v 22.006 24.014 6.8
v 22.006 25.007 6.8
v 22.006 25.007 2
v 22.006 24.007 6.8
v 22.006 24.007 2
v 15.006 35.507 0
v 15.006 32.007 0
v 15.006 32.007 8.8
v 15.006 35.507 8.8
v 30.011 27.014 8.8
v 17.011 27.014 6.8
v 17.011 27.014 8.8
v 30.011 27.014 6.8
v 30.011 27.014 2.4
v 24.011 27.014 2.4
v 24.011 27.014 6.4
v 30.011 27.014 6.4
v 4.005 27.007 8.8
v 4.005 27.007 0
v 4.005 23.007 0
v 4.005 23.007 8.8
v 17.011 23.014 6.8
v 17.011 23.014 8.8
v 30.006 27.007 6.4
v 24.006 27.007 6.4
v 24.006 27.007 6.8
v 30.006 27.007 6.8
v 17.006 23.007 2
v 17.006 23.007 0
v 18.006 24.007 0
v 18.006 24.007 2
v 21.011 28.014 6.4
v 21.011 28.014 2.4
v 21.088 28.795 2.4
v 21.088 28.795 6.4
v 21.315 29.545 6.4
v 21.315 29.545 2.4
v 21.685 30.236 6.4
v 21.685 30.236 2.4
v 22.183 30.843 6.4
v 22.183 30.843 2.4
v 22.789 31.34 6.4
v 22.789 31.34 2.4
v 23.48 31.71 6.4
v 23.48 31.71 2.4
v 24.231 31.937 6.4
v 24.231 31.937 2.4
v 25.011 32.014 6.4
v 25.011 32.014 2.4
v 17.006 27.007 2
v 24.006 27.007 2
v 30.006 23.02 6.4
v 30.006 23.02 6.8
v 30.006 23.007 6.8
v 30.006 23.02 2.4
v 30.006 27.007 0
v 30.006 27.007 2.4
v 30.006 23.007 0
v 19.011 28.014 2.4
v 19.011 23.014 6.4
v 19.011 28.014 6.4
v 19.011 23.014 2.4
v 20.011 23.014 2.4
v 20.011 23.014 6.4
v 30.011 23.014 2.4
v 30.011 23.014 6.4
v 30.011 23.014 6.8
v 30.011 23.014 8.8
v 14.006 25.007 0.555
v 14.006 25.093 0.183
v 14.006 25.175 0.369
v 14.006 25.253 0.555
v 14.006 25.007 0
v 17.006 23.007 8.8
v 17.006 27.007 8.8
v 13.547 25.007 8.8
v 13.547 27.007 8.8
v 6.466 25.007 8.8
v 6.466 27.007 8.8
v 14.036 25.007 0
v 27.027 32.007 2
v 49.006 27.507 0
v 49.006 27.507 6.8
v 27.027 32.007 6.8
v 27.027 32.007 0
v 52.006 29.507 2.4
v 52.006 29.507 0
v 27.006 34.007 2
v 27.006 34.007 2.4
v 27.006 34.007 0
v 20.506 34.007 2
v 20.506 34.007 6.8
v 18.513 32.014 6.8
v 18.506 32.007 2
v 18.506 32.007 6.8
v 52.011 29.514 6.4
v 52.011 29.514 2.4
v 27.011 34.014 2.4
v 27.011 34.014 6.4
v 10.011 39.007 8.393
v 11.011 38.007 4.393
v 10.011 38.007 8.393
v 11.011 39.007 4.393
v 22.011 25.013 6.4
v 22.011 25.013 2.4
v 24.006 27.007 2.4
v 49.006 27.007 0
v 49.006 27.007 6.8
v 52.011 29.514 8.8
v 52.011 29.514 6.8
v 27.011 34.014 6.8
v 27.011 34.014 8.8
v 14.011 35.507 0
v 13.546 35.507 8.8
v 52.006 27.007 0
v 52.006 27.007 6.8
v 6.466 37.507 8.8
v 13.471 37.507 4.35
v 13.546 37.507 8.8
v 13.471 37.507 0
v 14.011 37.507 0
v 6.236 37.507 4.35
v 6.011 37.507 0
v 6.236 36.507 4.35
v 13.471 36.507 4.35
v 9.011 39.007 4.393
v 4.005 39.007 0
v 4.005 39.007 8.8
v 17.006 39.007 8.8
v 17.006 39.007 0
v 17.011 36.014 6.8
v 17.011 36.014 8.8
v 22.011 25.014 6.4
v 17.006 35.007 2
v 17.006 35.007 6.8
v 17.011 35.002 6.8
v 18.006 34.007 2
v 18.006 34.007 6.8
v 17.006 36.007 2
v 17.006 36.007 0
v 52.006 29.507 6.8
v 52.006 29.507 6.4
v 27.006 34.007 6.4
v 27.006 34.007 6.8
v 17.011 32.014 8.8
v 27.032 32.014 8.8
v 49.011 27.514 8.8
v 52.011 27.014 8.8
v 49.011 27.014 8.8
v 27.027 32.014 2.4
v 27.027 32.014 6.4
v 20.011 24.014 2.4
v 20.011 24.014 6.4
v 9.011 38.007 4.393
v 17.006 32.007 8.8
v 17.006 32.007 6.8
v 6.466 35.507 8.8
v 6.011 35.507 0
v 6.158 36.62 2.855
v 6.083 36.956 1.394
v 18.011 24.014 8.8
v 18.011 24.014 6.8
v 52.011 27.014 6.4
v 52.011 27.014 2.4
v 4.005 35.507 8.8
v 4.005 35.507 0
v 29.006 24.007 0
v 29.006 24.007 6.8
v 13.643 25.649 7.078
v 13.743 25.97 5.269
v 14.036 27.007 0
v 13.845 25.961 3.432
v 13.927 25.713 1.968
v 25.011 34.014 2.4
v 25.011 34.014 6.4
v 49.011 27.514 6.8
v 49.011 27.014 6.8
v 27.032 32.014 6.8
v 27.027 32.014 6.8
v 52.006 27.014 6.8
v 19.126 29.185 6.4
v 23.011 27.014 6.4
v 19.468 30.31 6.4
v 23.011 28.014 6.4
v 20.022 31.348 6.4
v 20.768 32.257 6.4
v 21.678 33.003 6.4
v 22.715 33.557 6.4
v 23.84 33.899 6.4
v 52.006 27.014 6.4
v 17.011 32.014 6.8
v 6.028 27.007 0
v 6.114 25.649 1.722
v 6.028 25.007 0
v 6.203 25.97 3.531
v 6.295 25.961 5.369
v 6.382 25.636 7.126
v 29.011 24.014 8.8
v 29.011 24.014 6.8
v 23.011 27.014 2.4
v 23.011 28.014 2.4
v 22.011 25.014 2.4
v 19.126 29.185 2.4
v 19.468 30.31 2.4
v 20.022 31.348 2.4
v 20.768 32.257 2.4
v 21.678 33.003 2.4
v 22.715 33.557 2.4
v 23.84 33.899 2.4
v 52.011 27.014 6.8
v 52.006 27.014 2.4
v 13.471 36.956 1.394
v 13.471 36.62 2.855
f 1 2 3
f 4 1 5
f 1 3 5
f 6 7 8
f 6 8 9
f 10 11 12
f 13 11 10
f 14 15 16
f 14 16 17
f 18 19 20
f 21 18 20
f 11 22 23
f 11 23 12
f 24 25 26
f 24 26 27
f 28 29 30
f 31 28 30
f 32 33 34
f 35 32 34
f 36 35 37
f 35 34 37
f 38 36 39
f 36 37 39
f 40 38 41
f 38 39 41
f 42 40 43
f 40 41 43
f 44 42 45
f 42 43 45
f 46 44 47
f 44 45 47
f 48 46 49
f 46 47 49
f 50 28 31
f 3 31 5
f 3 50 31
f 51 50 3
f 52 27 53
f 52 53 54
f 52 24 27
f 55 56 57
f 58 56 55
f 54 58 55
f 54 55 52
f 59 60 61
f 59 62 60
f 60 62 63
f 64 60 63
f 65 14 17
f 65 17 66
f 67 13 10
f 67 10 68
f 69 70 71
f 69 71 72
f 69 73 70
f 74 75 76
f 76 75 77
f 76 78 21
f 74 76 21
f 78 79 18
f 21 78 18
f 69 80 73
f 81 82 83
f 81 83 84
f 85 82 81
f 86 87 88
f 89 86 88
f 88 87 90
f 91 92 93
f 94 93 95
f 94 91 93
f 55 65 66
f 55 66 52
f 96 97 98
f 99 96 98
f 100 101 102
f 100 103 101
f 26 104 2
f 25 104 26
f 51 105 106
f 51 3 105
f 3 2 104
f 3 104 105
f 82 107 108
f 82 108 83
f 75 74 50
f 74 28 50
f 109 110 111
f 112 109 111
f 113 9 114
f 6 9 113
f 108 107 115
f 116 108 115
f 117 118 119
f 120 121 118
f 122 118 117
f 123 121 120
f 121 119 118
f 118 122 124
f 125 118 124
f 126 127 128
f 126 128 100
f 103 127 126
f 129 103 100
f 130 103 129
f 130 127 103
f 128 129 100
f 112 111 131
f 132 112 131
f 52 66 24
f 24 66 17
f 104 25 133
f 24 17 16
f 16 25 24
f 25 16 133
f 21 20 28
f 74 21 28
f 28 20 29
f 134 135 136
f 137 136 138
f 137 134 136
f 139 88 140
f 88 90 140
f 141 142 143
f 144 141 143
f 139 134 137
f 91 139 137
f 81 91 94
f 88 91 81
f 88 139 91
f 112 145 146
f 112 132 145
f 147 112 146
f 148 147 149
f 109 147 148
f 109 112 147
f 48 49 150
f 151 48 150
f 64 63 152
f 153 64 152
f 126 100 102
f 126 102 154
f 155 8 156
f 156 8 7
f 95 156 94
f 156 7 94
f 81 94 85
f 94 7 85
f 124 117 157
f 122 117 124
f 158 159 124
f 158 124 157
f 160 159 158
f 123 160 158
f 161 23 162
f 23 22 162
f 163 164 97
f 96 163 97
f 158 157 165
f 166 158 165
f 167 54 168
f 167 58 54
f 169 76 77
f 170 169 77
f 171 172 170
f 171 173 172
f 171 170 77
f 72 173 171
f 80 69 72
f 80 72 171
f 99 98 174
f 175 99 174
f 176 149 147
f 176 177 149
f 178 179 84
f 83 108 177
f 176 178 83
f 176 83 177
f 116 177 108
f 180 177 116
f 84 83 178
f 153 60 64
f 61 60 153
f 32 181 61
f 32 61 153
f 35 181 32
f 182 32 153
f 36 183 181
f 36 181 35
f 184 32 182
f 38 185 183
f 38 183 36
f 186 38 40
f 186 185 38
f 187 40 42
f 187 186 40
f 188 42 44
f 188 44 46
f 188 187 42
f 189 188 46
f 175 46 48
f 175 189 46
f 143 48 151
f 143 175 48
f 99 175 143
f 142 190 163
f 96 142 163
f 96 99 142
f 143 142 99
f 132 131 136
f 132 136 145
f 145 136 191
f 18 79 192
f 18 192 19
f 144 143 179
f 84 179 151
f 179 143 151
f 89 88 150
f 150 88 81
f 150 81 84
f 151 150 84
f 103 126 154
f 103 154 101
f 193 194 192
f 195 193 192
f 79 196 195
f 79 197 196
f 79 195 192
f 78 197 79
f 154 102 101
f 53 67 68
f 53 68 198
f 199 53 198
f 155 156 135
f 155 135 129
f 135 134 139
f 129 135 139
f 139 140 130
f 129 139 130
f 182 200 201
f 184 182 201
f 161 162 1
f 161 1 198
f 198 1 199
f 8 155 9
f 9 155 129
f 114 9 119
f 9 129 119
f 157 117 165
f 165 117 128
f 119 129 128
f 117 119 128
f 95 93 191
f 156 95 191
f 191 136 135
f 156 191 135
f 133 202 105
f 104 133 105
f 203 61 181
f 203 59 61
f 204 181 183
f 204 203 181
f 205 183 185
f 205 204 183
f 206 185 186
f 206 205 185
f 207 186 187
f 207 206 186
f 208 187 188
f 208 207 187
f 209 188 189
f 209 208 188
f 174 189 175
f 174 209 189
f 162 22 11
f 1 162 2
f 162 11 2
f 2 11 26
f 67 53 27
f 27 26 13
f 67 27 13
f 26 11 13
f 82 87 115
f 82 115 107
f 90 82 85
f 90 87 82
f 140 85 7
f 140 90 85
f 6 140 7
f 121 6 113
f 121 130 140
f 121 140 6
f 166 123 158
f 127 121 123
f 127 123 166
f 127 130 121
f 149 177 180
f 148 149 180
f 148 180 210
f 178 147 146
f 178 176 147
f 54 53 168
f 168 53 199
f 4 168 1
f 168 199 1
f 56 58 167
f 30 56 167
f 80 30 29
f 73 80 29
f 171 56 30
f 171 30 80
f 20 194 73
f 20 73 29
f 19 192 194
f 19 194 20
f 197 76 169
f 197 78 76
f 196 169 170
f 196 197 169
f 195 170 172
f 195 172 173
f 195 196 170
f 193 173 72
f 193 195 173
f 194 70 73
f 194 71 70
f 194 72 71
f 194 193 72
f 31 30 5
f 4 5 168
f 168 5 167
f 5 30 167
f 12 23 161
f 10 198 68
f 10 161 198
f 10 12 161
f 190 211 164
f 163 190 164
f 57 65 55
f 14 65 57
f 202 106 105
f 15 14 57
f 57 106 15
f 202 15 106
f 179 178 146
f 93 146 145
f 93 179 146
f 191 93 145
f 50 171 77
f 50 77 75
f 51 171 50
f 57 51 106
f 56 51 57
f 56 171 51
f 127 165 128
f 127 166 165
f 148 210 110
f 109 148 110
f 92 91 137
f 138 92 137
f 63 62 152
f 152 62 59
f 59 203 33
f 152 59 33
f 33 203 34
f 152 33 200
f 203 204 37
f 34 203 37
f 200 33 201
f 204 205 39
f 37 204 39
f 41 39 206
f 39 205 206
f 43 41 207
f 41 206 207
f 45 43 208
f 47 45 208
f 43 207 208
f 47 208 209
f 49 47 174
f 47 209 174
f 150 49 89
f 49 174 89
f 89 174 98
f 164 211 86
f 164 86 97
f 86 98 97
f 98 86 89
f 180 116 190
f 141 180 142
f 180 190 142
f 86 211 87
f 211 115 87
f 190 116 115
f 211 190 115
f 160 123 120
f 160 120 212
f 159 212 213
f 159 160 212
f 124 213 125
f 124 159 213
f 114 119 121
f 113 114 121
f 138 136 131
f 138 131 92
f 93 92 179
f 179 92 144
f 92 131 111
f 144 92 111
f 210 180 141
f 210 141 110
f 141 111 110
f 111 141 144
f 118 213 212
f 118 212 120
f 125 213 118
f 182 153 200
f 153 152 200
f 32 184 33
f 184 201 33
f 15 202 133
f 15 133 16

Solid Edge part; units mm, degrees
sketch "Sketch1" plane through (0, 0, 0) normal (0, 0, 1) x (1, 0, 0)
  line L0 (4.0055, 39.0071) -> (17.0055, 39.0071)
  line L1 (17.0055, 36.0071) -> (17.0055, 39.0071)
  line L2 (17.0055, 36.0071) -> (17.0055, 35.0071)
  line L3 (17.0055, 35.0071) -> (17.0055, 32.0071)
  line L4 (15.0055, 32.0071) -> (17.0055, 32.0071)
  line L5 (15.0055, 32.0071) -> (15.0055, 37.5071)
  line L6 (15.0055, 37.5071) -> (5.0055, 37.5071)
  line L7 (5.0055, 37.5071) -> (5.0055, 35.5071)
  line L8 (5.0055, 35.5071) -> (4.0055, 35.5071)
  line L9 (4.0055, 35.5071) -> (4.0055, 39.0071)
  line L10 (15.0055, 27.0071) -> (17.0055, 27.0071)
  line L11 (17.0055, 23.0071) -> (17.0055, 27.0071)
  line L12 (4.0055, 23.0071) -> (17.0055, 23.0071)
  line L13 (4.0055, 27.0071) -> (4.0055, 23.0071)
  line L14 (5.0055, 27.0071) -> (4.0055, 27.0071)
  line L15 (5.0055, 25.0071) -> (5.0055, 27.0071)
  line L16 (15.0055, 25.0071) -> (5.0055, 25.0071)
  line L17 (15.0055, 25.0071) -> (15.0055, 27.0071)
  dimension "D1" = 22
  dimension "D2" = 9.7
  dimension "D3" = 8.1
extrude "Protrusion1" add sketch "Sketch1" along normal blind 8.8
sketch "Sketch2" plane through (0, 0, 0) normal (0, 0, 1) x (1, 0, 0)
  line L0 (27.0055, 34.0071) -> (17.0055, 36.0071)
  line L1 (17.0055, 36.0071) -> (17.0055, 35.0071)
  line L2 (17.0055, 35.0071) -> (17.0055, 32.0071)
  line L3 (17.0055, 32.0071) -> (18.5055, 32.0071)
  line L4 (25.0055, 32.0071) -> (18.5055, 32.0071)
  line L5 (25.0055, 32.0071) -> (27.0269, 32.0071)
  line L6 (49.0055, 27.5071) -> (27.0269, 32.0071)
  line L7 (49.0055, 27.0071) -> (49.0055, 27.5071)
  line L8 (49.0055, 27.0071) -> (52.0055, 27.0071)
  line L9 (52.0055, 27.0071) -> (52.0055, 29.5071)
  line L10 (52.0055, 29.5071) -> (27.0055, 34.0071)
  line L11 (17.0055, 23.0071) -> (18.0055, 24.0071)
  line L12 (18.0055, 24.0071) -> (22.0055, 24.0071)
  line L13 (29.0055, 24.0071) -> (22.0055, 24.0071)
  line L14 (30.0055, 23.0071) -> (29.0055, 24.0071)
  line L15 (30.0055, 27.0071) -> (30.0055, 23.0071)
  line L16 (24.0055, 27.0071) -> (30.0055, 27.0071)
  line L17 (24.0055, 27.0071) -> (17.0055, 27.0071)
  line L18 (17.0055, 23.0071) -> (17.0055, 27.0071)
  dimension "D1" = 22
  dimension "D2" = 9.7
  dimension "D3" = 8.1
extrude "RightEdgeProtrusion" add sketch "Sketch2" along normal blind 2
sketch "Sketch3" plane through (26.0055, 25.0071, 2.4) normal (0, 0, 1) x (1, 0, 0)
  line L0 (1.0055, 9.0071) -> (-0.9945, 9.0071)
  arc A0 (-6.9945, 3.0071) -> (-0.9945, 9.0071) centre (-0.9945, 3.0071) cw
  line L1 (-6.9945, -1.9929) -> (-6.9945, 3.0071)
  line L2 (-6.9945, -1.9929) -> (-5.9945, -1.9929)
  line L3 (-5.9945, -1.9929) -> (-5.9945, -0.9929)
  line L4 (-5.9945, -0.9929) -> (-2.9945, 2.0071)
  line L5 (-2.9945, 2.0071) -> (-2.9945, 3.0071)
  line L6 (-2.9945, 3.0071) -> (-4.9945, 3.0071)
  arc A1 (-4.9945, 3.0071) -> (-0.9945, 7.0071) centre (-0.9945, 3.0071) cw
  line L7 (-0.9945, 7.0071) -> (1.0269, 7.0071)
  line L8 (23.0055, 2.5071) -> (1.0269, 7.0071)
  line L9 (23.0055, 2.0071) -> (23.0055, 2.5071)
  line L10 (23.0055, 2.0071) -> (26.0055, 2.0071)
  line L11 (26.0055, 2.0071) -> (26.0055, 4.5071)
  line L12 (26.0055, 4.5071) -> (1.0055, 9.0071)
  line L13 (-1.9945, 2.0071) -> (4.0055, 2.0071)
  line L14 (4.0055, 2.0071) -> (4.0055, -1.9929)
  line L15 (4.0055, -1.9929) -> (3.0055, -0.9929)
  line L16 (3.0055, -0.9929) -> (-3.9945, -0.9929)
  line L17 (-3.9945, 0.0071) -> (-3.9945, -0.9929)
  line L18 (-3.9945, 0.0071) -> (-1.9945, 2.0071)
  dimension "D1" = 22
extrude "ClickerProtrusion" add sketch "Sketch3" along normal blind 4
sketch "Sketch4" plane through (0, 0, 0) normal (0, 0, 1) x (1, 0, 0)
  line L0 (17.0055, 35.0071) -> (18.0055, 34.0071)
  line L1 (20.5055, 34.0071) -> (18.0055, 34.0071)
  line L2 (20.5055, 34.0071) -> (18.5055, 32.0071)
  line L3 (17.0055, 32.0071) -> (18.5055, 32.0071)
  line L4 (17.0055, 35.0071) -> (17.0055, 32.0071)
  line L5 (27.0055, 34.0071) -> (27.0269, 32.0071)
  line L6 (49.0055, 27.5071) -> (27.0269, 32.0071)
  line L7 (49.0055, 27.0071) -> (49.0055, 27.5071)
  line L8 (49.0055, 27.0071) -> (52.0055, 27.0071)
  line L9 (52.0055, 27.0071) -> (52.0055, 29.5071)
  line L10 (52.0055, 29.5071) -> (27.0055, 34.0071)
  line L11 (24.0055, 27.0071) -> (30.0055, 27.0071)
  line L12 (30.0055, 27.0071) -> (30.0055, 23.0071)
  line L13 (30.0055, 23.0071) -> (29.0055, 24.0071)
  line L14 (29.0055, 24.0071) -> (22.0055, 24.0071)
  line L15 (22.0055, 25.0071) -> (22.0055, 24.0071)
  line L16 (22.0055, 25.0071) -> (24.0055, 27.0071)
  dimension "D1" = 22
  dimension "D2" = 9.7
  dimension "D3" = 8.1
extrude "SpacerProtrusion" add sketch "Sketch4" along normal blind 6.8
sketch "Sketch5" plane through (26.0055, 25.0071, 6.8) normal (0, 0, 1) x (1, 0, 0)
  line L0 (1.0055, 9.0071) -> (-8.9945, 11.0071)
  line L1 (-8.9945, 11.0071) -> (-8.9945, 10.0071)
  line L2 (-8.9945, 10.0071) -> (-8.9945, 7.0071)
  line L3 (-8.9945, 7.0071) -> (-7.4945, 7.0071)
  line L4 (-0.9945, 7.0071) -> (-7.4945, 7.0071)
  line L5 (-0.9945, 7.0071) -> (1.0269, 7.0071)
  line L6 (23.0055, 2.5071) -> (1.0269, 7.0071)
  line L7 (23.0055, 2.0071) -> (23.0055, 2.5071)
  line L8 (23.0055, 2.0071) -> (26.0055, 2.0071)
  line L9 (26.0055, 2.0071) -> (26.0055, 4.5071)
  line L10 (26.0055, 4.5071) -> (1.0055, 9.0071)
  line L11 (-1.9945, 2.0071) -> (-8.9945, 2.0071)
  line L12 (-8.9945, -1.9929) -> (-8.9945, 2.0071)
  line L13 (-8.9945, -1.9929) -> (-7.9945, -0.9929)
  line L14 (-7.9945, -0.9929) -> (-3.9945, -0.9929)
  line L15 (3.0055, -0.9929) -> (-3.9945, -0.9929)
  line L16 (4.0055, -1.9929) -> (3.0055, -0.9929)
  line L17 (4.0055, 2.0071) -> (4.0055, -1.9929)
  line L18 (-1.9945, 2.0071) -> (4.0055, 2.0071)
  dimension "D1" = 22
extrude "LeftEdgeProtrusion" add sketch "Sketch5" along normal blind 2
sketch "Sketch6" plane through (10.0055, 37.5071, 4.4) normal (0, -1, 0) x (1, 0, 0)
  line L0 (-3.54, 4.4) -> (-3.9945, -4.4)
  line L1 (-3.9945, -4.4) -> (-5, -4.4)
  line L2 (-5, -4.4) -> (-5, 4.4)
  line L3 (-5, 4.4) -> (-3.54, 4.4)
  line L4 (3.54, 4.4) -> (4.0055, -4.4)
  line L5 (4.0055, -4.4) -> (5, -4.4)
  line L6 (5, -4.4) -> (5, 4.4)
  line L7 (5, 4.4) -> (3.54, 4.4)
  dimension "D1" = 10
extrude "SlantedTopProtrusion" add sketch "Sketch6" along normal blind 2
sketch "Sketch7" plane through (4.0055, 37.2571, 4.4) normal (-1, 0, 0) x (0, 0, 1)
  line L0 (-4.4, 0.25) -> (-0.05, 0.25)
  line L1 (-0.05, 0.25) -> (-0.05, -0.75)
  arc A0 (-0.05, -0.75) -> (-4.4, 0.25) centre (-0.05, 9.2112) cw
extrude "TopArcProtrusion" add sketch "Sketch7" against normal blind 9.4652
sketch "Sketch8" plane through (10.0055, 25.0071, 4.4) normal (0, 1, 0) x (0, 0, 1)
  line L0 (4.4, 3.5413) -> (-4.4, 4.0309)
  line L1 (-4.4, 4.0309) -> (-4.4, 5.0014)
  line L2 (-4.4, 5.0014) -> (4.4, 5)
  line L3 (4.4, 5) -> (4.4, 3.5413)
  line L4 (4.4, -3.54) -> (4.4, -5)
  line L5 (4.4, -5) -> (-4.4, -5)
  line L6 (-4.4, -5) -> (-4.4, -3.9776)
  line L7 (-4.4, -3.9776) -> (4.4, -3.54)
extrude "BottomSlantedProtrusion" add sketch "Sketch8" along normal blind 2
sketch "Sketch9" plane through (4.0055, 25.0071, 4.4) normal (-1, 0, 0) x (0, 0, 1)
  arc A0 (-4.4, 0) -> (4.4, 0) centre (0, -9.175) cw
  line L0 (-4.4, 0) -> (4.4, 0)
extrude "BottomArcProtrusion" add sketch "Sketch9" against normal blind 10
sketch "Sketch10" plane through (10.5055, 39.0071, 4.4) normal (0, 1, 0) x (1, 0, 0)
  line L0 (-1.4945, 0.0071) -> (0.5055, 0.0071)
  line L1 (0.5055, 0.0071) -> (-0.4945, -3.9929)
  line L2 (-0.4945, -3.9929) -> (-1.4945, 0.0071)
extrude "TriangleCutout" cut sketch "Sketch10" against normal blind 1
